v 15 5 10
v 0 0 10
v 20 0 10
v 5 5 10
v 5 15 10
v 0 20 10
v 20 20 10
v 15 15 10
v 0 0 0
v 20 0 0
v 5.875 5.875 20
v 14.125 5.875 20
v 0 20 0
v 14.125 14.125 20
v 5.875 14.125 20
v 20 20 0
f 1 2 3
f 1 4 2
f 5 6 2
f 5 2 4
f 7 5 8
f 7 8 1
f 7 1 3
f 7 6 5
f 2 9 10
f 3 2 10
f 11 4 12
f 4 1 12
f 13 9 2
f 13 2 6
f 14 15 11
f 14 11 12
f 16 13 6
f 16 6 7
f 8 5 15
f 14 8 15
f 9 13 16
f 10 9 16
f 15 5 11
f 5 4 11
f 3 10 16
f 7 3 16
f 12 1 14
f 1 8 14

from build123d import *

# Parameters (mm, degrees)
SKETCH_1_W         = 20
SKETCH_1_H         = 20
BASEBOX_DEPTH      = 10
SKETCH_2_W         = 10
SKETCH_2_H         = 10
DRAFTOUTWARD_DEPTH = 10
DRAFTOUTWARD_TAPER = 5


with BuildPart() as part:
    # 草图1 → BaseBox (new body)
    with BuildSketch(Plane.XY):
        with Locations((10, 10)):
            Rectangle(SKETCH_1_W, SKETCH_1_H)
    extrude(amount=BASEBOX_DEPTH)

    # 草图2 → DraftOutward (add)
    with BuildSketch(Plane.XY.offset(10)):
        with Locations((10, 10)):
            Rectangle(SKETCH_2_W, SKETCH_2_H)
    extrude(amount=DRAFTOUTWARD_DEPTH, taper=DRAFTOUTWARD_TAPER)


solid = part.part
